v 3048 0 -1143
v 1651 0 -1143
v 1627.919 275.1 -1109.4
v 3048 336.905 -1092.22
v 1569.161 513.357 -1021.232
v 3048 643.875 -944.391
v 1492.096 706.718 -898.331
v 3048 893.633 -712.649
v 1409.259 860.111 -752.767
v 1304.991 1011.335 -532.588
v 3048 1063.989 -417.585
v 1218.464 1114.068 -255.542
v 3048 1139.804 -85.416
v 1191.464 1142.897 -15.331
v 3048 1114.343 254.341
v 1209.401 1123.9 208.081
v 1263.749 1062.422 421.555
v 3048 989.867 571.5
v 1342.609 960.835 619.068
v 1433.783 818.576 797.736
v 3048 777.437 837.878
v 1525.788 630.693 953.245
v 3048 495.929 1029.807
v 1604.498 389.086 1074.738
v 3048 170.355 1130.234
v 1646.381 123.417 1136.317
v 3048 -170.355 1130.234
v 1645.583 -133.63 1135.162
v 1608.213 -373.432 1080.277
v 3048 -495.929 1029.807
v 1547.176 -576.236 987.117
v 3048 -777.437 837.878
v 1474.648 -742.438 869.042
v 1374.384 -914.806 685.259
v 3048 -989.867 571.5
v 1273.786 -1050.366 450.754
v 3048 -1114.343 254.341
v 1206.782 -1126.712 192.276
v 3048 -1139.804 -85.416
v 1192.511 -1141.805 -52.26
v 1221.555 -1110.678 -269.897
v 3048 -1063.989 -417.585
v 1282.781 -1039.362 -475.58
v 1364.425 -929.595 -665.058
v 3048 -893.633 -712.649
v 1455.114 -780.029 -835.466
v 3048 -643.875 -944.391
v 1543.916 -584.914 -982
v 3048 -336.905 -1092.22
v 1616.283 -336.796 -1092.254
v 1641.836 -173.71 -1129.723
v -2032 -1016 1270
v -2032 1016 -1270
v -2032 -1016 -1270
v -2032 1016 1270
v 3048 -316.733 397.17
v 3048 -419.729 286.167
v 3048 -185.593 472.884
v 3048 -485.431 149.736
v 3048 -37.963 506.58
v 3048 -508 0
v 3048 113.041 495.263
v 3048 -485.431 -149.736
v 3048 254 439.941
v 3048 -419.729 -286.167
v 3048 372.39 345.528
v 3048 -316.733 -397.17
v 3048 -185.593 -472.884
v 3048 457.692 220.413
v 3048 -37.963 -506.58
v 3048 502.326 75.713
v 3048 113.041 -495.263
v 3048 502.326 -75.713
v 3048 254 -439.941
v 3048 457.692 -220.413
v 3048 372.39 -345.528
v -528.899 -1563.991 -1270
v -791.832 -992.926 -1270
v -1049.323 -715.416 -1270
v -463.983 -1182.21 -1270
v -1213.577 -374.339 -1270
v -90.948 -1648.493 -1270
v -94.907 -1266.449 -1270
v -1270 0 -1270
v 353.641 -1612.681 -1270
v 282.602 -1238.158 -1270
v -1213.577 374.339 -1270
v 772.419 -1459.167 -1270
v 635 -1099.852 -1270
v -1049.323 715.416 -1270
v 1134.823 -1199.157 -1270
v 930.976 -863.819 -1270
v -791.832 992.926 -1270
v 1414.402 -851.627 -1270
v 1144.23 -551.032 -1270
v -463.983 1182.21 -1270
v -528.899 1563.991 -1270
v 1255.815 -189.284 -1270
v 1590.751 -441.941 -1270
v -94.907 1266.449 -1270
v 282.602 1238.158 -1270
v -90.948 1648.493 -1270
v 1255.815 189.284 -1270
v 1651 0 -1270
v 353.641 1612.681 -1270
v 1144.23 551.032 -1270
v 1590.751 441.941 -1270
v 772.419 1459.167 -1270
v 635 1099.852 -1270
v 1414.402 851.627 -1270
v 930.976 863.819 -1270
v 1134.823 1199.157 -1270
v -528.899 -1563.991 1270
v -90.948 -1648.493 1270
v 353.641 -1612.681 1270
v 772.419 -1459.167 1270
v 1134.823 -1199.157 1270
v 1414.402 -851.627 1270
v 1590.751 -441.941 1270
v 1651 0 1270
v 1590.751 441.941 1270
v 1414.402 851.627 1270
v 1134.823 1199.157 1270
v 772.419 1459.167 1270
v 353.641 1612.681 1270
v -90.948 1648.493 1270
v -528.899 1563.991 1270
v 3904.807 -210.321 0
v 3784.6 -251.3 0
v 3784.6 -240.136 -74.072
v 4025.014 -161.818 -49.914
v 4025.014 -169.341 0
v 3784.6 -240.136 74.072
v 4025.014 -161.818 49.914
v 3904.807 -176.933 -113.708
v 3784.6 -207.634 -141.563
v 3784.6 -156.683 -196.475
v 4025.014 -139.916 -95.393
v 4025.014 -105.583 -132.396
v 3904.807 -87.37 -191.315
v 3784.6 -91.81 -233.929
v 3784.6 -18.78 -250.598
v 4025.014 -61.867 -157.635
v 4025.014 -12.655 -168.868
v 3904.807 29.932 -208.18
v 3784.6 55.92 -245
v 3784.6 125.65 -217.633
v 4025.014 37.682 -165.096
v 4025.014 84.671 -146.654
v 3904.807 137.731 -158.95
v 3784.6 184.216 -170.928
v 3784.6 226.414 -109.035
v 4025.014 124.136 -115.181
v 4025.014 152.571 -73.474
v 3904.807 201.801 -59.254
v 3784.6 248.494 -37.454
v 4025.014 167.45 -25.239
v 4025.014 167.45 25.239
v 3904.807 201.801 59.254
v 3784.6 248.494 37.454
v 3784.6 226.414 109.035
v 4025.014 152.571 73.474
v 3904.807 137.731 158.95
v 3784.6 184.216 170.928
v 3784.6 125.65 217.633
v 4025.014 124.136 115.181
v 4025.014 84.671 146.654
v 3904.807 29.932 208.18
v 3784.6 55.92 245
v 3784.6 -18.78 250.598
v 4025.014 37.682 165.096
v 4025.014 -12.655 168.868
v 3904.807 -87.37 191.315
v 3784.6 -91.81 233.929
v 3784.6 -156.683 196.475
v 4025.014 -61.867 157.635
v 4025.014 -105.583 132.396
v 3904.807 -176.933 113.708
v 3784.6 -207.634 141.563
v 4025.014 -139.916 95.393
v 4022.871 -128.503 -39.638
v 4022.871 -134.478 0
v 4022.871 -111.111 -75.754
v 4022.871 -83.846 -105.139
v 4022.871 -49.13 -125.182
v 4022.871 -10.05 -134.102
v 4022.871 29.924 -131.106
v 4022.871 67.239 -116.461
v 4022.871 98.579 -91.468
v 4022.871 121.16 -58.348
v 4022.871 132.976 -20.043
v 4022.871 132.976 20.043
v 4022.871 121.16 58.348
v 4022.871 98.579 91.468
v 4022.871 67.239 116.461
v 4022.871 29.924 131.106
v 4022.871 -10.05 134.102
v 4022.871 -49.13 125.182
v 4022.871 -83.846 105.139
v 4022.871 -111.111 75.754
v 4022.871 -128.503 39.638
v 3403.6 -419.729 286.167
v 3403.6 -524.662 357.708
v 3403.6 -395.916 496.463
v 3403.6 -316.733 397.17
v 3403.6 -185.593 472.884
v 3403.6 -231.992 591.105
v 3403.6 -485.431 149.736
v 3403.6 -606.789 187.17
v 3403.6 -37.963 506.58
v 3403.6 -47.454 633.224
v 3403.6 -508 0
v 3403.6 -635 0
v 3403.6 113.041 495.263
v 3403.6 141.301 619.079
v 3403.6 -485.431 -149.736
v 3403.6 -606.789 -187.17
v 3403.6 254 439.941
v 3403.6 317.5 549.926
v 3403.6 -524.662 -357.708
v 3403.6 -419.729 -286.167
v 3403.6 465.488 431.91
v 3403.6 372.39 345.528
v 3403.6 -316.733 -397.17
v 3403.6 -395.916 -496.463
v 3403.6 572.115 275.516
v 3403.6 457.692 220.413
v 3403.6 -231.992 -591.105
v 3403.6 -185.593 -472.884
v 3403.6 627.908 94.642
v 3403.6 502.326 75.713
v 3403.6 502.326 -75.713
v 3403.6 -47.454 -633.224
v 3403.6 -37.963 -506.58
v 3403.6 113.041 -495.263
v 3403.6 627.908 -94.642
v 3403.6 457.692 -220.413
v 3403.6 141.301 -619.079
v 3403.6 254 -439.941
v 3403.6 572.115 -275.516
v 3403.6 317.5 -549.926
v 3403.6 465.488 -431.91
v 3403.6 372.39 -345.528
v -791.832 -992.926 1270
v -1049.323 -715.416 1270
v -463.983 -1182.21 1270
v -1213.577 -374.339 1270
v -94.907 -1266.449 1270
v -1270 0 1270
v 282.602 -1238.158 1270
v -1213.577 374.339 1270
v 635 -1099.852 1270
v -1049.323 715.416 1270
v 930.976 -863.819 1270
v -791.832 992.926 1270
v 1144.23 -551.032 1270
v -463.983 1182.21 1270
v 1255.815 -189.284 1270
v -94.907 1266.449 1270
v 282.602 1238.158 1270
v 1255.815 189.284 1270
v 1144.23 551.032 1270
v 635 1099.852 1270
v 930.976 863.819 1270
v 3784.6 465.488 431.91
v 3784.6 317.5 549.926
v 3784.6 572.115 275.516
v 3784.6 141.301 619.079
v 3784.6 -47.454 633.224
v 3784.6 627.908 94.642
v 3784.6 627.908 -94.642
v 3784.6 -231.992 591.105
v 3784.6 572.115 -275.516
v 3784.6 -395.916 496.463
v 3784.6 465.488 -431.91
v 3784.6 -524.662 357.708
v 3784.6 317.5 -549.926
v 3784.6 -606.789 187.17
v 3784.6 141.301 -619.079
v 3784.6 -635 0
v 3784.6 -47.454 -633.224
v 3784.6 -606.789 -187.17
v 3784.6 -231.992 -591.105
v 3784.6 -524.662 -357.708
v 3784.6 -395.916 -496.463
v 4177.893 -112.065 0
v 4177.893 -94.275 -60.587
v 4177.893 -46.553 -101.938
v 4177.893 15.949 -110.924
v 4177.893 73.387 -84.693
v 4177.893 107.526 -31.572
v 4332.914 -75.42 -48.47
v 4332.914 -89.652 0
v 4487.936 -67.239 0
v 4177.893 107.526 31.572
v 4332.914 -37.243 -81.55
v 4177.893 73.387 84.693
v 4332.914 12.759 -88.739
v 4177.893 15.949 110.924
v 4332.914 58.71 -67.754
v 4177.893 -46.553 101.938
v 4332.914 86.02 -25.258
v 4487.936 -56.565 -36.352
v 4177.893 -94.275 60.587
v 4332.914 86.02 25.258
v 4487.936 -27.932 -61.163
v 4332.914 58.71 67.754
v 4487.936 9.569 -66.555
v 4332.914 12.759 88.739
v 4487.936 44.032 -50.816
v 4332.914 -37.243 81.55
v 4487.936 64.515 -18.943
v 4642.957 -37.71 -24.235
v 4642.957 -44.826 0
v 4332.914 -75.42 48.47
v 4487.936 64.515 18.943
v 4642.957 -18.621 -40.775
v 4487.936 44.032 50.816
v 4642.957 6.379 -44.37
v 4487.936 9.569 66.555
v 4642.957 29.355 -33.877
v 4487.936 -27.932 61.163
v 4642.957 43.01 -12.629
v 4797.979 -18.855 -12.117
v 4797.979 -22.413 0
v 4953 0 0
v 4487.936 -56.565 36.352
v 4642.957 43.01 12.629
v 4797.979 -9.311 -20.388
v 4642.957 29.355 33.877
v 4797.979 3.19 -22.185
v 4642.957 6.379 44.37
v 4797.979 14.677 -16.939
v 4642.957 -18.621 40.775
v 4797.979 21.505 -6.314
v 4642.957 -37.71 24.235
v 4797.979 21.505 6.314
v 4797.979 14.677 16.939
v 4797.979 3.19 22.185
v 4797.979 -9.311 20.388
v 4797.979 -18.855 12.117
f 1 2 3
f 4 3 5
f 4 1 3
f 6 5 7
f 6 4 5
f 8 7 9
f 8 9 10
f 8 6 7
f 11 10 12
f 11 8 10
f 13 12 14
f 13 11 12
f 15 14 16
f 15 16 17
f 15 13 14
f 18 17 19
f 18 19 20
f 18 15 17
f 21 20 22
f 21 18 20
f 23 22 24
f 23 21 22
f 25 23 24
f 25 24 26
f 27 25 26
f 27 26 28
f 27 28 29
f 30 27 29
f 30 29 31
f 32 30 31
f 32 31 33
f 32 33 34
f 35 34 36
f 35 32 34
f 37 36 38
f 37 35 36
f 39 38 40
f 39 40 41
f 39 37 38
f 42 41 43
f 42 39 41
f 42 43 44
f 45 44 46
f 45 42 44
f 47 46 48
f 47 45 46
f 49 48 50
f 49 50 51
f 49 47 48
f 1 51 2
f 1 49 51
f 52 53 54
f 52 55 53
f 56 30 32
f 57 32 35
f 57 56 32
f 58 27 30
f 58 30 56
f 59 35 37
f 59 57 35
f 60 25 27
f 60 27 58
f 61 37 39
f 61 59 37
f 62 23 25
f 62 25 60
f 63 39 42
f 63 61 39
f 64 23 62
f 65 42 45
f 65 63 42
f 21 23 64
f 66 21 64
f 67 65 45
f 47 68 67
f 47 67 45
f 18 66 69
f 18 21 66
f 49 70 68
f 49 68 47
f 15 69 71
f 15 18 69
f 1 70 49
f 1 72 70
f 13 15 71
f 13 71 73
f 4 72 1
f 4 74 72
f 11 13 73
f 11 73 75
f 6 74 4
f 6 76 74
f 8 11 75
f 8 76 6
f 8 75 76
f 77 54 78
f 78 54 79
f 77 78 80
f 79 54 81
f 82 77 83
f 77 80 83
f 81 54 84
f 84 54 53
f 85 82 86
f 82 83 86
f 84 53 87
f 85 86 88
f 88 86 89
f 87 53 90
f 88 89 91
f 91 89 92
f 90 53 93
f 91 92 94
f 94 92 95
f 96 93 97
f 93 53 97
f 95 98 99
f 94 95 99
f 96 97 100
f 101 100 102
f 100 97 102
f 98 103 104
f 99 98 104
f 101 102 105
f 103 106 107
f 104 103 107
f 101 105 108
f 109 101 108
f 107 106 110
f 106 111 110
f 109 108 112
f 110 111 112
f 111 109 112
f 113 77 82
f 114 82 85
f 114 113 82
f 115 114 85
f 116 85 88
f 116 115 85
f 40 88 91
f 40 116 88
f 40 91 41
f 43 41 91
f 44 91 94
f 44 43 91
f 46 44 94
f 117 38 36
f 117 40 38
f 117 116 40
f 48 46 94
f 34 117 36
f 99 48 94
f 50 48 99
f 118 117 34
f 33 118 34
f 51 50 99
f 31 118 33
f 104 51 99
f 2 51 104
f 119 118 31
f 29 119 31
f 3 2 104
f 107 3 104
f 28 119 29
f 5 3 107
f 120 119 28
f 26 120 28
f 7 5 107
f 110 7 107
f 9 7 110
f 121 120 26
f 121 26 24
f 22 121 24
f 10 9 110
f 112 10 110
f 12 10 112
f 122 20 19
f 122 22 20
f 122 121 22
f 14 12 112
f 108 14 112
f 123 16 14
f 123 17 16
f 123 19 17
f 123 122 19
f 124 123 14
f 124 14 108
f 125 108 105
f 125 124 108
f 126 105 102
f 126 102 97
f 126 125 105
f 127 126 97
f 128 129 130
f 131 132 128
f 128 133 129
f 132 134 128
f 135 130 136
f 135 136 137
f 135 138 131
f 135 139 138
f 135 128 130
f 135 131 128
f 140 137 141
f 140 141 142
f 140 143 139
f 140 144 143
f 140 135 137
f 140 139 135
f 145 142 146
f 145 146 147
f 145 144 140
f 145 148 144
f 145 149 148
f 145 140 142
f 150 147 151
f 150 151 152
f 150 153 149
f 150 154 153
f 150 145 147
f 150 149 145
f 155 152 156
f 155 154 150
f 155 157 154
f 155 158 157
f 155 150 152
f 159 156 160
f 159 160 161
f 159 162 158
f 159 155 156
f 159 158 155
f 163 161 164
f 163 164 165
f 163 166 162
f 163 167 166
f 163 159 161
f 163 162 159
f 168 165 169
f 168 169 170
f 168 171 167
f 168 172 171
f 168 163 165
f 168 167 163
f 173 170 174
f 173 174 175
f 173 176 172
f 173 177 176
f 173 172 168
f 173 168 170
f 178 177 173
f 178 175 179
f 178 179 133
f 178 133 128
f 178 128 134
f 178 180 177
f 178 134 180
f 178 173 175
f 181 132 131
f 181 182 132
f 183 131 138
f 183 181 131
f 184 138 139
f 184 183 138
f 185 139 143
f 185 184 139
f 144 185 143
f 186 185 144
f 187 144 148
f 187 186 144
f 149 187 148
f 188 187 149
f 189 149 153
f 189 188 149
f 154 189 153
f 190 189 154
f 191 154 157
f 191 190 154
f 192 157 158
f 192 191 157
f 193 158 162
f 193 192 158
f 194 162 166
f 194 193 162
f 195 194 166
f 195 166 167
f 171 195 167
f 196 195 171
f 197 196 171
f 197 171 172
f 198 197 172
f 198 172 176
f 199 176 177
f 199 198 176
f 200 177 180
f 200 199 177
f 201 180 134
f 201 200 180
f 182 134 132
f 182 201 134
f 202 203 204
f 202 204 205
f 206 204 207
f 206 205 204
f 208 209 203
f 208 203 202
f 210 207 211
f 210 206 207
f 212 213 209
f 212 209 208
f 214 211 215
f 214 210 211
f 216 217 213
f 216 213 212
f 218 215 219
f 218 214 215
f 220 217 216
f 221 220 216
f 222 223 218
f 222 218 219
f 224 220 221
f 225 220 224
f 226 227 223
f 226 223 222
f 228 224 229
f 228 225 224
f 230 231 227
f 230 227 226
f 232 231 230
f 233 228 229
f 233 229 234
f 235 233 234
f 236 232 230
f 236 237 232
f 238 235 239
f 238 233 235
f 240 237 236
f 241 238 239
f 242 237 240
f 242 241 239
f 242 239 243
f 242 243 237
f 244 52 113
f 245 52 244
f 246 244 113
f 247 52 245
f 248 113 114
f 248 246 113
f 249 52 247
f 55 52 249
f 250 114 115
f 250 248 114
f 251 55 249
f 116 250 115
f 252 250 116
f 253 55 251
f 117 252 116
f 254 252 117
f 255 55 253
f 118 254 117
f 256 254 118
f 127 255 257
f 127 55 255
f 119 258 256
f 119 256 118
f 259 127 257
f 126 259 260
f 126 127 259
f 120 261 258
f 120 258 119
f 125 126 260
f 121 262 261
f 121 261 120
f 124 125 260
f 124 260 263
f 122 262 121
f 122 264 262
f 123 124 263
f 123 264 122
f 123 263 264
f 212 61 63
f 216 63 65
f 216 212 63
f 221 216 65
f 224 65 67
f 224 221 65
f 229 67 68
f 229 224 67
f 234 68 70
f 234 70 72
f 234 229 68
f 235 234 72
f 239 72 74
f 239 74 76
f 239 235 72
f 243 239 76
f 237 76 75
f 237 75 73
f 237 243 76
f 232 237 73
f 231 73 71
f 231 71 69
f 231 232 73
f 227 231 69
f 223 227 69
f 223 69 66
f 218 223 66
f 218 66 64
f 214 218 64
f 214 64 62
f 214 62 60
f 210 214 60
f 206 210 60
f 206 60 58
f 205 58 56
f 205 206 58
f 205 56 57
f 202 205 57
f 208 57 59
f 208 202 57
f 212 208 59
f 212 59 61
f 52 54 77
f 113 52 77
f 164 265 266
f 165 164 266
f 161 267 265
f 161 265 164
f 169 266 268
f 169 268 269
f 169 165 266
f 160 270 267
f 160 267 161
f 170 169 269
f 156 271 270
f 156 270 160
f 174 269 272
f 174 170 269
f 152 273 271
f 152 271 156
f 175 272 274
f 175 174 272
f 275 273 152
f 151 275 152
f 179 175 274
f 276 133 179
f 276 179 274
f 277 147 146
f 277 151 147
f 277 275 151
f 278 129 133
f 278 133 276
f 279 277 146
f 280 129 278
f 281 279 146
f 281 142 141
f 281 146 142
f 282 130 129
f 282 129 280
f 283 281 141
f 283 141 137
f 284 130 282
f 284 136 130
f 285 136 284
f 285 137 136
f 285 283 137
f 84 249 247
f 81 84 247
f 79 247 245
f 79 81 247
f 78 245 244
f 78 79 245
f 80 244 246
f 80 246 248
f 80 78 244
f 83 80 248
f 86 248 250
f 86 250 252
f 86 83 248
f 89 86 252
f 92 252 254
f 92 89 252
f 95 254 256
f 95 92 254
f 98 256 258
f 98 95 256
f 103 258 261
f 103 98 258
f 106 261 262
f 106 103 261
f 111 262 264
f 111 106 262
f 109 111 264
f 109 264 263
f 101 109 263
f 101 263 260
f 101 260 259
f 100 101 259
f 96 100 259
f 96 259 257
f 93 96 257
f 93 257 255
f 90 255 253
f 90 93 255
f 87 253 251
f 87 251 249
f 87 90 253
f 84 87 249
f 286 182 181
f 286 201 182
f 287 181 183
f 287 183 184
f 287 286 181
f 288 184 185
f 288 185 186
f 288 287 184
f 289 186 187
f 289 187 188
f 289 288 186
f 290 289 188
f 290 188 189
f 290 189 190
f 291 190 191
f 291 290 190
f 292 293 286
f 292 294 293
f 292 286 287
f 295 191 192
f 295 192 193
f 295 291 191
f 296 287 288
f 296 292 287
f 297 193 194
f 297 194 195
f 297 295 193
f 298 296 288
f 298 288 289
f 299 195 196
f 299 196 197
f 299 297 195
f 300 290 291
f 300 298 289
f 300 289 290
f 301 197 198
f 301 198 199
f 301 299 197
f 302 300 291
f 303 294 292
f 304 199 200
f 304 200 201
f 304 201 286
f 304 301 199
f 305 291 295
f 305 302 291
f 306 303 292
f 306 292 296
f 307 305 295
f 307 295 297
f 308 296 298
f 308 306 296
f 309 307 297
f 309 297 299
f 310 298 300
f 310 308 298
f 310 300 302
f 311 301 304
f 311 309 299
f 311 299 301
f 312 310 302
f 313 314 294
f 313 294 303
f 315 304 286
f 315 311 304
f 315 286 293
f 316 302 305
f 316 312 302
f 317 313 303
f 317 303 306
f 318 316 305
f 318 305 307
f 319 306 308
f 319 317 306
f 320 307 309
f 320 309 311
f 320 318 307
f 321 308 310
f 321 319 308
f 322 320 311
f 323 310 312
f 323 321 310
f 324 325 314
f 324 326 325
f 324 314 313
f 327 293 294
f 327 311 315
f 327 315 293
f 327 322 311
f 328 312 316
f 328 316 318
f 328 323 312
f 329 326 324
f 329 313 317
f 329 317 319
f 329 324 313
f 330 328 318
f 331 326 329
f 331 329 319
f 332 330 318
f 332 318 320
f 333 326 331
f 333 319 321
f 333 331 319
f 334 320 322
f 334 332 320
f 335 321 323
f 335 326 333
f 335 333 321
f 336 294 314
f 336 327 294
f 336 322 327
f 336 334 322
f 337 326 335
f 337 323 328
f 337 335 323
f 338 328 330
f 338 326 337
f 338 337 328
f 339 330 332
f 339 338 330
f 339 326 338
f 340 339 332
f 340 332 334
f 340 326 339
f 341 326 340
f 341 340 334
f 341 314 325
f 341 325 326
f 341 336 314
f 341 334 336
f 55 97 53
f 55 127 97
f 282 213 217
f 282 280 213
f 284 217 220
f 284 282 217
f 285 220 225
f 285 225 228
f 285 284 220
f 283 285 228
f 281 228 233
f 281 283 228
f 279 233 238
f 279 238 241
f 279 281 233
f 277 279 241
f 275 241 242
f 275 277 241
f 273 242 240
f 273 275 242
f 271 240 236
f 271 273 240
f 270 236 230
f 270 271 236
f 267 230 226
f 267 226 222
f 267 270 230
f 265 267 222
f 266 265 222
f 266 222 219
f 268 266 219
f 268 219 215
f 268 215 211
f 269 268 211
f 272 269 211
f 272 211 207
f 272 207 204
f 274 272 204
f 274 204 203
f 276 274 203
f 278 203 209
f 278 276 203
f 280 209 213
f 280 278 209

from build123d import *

# Parameters (mm, degrees)
SKETCH1_R                = 1270
BOSS_EXTRUDE1_DEPTH      = 1270
BOSS_EXTRUDE2_REACH      = 5492.455
BOSS_EXTRUDE2_END_RADIUS = 1651
SKETCH2_R                = 1143


with BuildPart() as part:
    # Sketch1 → Boss-Extrude1 (new, symmetric)
    with BuildSketch(Plane.XY):
        with BuildLine():
            Line((-2032, 1016), (-2032, -1016))
            Line((-2032, -1016), (-528.898626564, -1563.990806501))
            ThreePointArc((-528.898626564, -1563.990806501), (1651, 0), (-528.898626564, 1563.990806501))
            Line((-528.898626564, 1563.990806501), (-2032, 1016))
        make_face()
        with Locations(Location((0, 0, 0), (0, 0, 180))):
            Circle(SKETCH1_R, mode=Mode.SUBTRACT)
    extrude(amount=BOSS_EXTRUDE1_DEPTH, both=True)

    # Boss-Extrude2: up to this cylinder (the profile starts outside it)
    boss_extrude2_end = Plane(origin=(0, 0, 0), z_dir=(0, 0, -1)) * Cylinder(BOSS_EXTRUDE2_END_RADIUS, 14287.91, mode=Mode.PRIVATE)
    # Sketch2 → Boss-Extrude2 (add, up to the surface)
    with BuildSketch(Plane(origin=(3048, 0, 0), x_dir=(0, 0, -1), z_dir=(1, 0, 0)), mode=Mode.PRIVATE) as boss_extrude2_sk1:
        Circle(SKETCH2_R)
    boss_extrude2_tool1 = extrude(boss_extrude2_sk1.sketch, amount=-BOSS_EXTRUDE2_REACH, mode=Mode.PRIVATE) - boss_extrude2_end
    add(boss_extrude2_tool1.solids().sort_by_distance((3048, 0, 0))[0])

    # Sketch3 → Revolve1 (revolve)
    with BuildSketch(Plane.XY):
        Polygon((3048, 0), (3048, -508), (3403.6, -508), (3403.6, -635), (3784.6, -635), (3784.6, -251.300483092), (4025.013587797, -169.341305434), (4022.871127105, -134.477952869), (4953, 0), align=None)
    revolve(axis=Axis((0, 0, 0), (1, 0, 0)))


solid = part.part
